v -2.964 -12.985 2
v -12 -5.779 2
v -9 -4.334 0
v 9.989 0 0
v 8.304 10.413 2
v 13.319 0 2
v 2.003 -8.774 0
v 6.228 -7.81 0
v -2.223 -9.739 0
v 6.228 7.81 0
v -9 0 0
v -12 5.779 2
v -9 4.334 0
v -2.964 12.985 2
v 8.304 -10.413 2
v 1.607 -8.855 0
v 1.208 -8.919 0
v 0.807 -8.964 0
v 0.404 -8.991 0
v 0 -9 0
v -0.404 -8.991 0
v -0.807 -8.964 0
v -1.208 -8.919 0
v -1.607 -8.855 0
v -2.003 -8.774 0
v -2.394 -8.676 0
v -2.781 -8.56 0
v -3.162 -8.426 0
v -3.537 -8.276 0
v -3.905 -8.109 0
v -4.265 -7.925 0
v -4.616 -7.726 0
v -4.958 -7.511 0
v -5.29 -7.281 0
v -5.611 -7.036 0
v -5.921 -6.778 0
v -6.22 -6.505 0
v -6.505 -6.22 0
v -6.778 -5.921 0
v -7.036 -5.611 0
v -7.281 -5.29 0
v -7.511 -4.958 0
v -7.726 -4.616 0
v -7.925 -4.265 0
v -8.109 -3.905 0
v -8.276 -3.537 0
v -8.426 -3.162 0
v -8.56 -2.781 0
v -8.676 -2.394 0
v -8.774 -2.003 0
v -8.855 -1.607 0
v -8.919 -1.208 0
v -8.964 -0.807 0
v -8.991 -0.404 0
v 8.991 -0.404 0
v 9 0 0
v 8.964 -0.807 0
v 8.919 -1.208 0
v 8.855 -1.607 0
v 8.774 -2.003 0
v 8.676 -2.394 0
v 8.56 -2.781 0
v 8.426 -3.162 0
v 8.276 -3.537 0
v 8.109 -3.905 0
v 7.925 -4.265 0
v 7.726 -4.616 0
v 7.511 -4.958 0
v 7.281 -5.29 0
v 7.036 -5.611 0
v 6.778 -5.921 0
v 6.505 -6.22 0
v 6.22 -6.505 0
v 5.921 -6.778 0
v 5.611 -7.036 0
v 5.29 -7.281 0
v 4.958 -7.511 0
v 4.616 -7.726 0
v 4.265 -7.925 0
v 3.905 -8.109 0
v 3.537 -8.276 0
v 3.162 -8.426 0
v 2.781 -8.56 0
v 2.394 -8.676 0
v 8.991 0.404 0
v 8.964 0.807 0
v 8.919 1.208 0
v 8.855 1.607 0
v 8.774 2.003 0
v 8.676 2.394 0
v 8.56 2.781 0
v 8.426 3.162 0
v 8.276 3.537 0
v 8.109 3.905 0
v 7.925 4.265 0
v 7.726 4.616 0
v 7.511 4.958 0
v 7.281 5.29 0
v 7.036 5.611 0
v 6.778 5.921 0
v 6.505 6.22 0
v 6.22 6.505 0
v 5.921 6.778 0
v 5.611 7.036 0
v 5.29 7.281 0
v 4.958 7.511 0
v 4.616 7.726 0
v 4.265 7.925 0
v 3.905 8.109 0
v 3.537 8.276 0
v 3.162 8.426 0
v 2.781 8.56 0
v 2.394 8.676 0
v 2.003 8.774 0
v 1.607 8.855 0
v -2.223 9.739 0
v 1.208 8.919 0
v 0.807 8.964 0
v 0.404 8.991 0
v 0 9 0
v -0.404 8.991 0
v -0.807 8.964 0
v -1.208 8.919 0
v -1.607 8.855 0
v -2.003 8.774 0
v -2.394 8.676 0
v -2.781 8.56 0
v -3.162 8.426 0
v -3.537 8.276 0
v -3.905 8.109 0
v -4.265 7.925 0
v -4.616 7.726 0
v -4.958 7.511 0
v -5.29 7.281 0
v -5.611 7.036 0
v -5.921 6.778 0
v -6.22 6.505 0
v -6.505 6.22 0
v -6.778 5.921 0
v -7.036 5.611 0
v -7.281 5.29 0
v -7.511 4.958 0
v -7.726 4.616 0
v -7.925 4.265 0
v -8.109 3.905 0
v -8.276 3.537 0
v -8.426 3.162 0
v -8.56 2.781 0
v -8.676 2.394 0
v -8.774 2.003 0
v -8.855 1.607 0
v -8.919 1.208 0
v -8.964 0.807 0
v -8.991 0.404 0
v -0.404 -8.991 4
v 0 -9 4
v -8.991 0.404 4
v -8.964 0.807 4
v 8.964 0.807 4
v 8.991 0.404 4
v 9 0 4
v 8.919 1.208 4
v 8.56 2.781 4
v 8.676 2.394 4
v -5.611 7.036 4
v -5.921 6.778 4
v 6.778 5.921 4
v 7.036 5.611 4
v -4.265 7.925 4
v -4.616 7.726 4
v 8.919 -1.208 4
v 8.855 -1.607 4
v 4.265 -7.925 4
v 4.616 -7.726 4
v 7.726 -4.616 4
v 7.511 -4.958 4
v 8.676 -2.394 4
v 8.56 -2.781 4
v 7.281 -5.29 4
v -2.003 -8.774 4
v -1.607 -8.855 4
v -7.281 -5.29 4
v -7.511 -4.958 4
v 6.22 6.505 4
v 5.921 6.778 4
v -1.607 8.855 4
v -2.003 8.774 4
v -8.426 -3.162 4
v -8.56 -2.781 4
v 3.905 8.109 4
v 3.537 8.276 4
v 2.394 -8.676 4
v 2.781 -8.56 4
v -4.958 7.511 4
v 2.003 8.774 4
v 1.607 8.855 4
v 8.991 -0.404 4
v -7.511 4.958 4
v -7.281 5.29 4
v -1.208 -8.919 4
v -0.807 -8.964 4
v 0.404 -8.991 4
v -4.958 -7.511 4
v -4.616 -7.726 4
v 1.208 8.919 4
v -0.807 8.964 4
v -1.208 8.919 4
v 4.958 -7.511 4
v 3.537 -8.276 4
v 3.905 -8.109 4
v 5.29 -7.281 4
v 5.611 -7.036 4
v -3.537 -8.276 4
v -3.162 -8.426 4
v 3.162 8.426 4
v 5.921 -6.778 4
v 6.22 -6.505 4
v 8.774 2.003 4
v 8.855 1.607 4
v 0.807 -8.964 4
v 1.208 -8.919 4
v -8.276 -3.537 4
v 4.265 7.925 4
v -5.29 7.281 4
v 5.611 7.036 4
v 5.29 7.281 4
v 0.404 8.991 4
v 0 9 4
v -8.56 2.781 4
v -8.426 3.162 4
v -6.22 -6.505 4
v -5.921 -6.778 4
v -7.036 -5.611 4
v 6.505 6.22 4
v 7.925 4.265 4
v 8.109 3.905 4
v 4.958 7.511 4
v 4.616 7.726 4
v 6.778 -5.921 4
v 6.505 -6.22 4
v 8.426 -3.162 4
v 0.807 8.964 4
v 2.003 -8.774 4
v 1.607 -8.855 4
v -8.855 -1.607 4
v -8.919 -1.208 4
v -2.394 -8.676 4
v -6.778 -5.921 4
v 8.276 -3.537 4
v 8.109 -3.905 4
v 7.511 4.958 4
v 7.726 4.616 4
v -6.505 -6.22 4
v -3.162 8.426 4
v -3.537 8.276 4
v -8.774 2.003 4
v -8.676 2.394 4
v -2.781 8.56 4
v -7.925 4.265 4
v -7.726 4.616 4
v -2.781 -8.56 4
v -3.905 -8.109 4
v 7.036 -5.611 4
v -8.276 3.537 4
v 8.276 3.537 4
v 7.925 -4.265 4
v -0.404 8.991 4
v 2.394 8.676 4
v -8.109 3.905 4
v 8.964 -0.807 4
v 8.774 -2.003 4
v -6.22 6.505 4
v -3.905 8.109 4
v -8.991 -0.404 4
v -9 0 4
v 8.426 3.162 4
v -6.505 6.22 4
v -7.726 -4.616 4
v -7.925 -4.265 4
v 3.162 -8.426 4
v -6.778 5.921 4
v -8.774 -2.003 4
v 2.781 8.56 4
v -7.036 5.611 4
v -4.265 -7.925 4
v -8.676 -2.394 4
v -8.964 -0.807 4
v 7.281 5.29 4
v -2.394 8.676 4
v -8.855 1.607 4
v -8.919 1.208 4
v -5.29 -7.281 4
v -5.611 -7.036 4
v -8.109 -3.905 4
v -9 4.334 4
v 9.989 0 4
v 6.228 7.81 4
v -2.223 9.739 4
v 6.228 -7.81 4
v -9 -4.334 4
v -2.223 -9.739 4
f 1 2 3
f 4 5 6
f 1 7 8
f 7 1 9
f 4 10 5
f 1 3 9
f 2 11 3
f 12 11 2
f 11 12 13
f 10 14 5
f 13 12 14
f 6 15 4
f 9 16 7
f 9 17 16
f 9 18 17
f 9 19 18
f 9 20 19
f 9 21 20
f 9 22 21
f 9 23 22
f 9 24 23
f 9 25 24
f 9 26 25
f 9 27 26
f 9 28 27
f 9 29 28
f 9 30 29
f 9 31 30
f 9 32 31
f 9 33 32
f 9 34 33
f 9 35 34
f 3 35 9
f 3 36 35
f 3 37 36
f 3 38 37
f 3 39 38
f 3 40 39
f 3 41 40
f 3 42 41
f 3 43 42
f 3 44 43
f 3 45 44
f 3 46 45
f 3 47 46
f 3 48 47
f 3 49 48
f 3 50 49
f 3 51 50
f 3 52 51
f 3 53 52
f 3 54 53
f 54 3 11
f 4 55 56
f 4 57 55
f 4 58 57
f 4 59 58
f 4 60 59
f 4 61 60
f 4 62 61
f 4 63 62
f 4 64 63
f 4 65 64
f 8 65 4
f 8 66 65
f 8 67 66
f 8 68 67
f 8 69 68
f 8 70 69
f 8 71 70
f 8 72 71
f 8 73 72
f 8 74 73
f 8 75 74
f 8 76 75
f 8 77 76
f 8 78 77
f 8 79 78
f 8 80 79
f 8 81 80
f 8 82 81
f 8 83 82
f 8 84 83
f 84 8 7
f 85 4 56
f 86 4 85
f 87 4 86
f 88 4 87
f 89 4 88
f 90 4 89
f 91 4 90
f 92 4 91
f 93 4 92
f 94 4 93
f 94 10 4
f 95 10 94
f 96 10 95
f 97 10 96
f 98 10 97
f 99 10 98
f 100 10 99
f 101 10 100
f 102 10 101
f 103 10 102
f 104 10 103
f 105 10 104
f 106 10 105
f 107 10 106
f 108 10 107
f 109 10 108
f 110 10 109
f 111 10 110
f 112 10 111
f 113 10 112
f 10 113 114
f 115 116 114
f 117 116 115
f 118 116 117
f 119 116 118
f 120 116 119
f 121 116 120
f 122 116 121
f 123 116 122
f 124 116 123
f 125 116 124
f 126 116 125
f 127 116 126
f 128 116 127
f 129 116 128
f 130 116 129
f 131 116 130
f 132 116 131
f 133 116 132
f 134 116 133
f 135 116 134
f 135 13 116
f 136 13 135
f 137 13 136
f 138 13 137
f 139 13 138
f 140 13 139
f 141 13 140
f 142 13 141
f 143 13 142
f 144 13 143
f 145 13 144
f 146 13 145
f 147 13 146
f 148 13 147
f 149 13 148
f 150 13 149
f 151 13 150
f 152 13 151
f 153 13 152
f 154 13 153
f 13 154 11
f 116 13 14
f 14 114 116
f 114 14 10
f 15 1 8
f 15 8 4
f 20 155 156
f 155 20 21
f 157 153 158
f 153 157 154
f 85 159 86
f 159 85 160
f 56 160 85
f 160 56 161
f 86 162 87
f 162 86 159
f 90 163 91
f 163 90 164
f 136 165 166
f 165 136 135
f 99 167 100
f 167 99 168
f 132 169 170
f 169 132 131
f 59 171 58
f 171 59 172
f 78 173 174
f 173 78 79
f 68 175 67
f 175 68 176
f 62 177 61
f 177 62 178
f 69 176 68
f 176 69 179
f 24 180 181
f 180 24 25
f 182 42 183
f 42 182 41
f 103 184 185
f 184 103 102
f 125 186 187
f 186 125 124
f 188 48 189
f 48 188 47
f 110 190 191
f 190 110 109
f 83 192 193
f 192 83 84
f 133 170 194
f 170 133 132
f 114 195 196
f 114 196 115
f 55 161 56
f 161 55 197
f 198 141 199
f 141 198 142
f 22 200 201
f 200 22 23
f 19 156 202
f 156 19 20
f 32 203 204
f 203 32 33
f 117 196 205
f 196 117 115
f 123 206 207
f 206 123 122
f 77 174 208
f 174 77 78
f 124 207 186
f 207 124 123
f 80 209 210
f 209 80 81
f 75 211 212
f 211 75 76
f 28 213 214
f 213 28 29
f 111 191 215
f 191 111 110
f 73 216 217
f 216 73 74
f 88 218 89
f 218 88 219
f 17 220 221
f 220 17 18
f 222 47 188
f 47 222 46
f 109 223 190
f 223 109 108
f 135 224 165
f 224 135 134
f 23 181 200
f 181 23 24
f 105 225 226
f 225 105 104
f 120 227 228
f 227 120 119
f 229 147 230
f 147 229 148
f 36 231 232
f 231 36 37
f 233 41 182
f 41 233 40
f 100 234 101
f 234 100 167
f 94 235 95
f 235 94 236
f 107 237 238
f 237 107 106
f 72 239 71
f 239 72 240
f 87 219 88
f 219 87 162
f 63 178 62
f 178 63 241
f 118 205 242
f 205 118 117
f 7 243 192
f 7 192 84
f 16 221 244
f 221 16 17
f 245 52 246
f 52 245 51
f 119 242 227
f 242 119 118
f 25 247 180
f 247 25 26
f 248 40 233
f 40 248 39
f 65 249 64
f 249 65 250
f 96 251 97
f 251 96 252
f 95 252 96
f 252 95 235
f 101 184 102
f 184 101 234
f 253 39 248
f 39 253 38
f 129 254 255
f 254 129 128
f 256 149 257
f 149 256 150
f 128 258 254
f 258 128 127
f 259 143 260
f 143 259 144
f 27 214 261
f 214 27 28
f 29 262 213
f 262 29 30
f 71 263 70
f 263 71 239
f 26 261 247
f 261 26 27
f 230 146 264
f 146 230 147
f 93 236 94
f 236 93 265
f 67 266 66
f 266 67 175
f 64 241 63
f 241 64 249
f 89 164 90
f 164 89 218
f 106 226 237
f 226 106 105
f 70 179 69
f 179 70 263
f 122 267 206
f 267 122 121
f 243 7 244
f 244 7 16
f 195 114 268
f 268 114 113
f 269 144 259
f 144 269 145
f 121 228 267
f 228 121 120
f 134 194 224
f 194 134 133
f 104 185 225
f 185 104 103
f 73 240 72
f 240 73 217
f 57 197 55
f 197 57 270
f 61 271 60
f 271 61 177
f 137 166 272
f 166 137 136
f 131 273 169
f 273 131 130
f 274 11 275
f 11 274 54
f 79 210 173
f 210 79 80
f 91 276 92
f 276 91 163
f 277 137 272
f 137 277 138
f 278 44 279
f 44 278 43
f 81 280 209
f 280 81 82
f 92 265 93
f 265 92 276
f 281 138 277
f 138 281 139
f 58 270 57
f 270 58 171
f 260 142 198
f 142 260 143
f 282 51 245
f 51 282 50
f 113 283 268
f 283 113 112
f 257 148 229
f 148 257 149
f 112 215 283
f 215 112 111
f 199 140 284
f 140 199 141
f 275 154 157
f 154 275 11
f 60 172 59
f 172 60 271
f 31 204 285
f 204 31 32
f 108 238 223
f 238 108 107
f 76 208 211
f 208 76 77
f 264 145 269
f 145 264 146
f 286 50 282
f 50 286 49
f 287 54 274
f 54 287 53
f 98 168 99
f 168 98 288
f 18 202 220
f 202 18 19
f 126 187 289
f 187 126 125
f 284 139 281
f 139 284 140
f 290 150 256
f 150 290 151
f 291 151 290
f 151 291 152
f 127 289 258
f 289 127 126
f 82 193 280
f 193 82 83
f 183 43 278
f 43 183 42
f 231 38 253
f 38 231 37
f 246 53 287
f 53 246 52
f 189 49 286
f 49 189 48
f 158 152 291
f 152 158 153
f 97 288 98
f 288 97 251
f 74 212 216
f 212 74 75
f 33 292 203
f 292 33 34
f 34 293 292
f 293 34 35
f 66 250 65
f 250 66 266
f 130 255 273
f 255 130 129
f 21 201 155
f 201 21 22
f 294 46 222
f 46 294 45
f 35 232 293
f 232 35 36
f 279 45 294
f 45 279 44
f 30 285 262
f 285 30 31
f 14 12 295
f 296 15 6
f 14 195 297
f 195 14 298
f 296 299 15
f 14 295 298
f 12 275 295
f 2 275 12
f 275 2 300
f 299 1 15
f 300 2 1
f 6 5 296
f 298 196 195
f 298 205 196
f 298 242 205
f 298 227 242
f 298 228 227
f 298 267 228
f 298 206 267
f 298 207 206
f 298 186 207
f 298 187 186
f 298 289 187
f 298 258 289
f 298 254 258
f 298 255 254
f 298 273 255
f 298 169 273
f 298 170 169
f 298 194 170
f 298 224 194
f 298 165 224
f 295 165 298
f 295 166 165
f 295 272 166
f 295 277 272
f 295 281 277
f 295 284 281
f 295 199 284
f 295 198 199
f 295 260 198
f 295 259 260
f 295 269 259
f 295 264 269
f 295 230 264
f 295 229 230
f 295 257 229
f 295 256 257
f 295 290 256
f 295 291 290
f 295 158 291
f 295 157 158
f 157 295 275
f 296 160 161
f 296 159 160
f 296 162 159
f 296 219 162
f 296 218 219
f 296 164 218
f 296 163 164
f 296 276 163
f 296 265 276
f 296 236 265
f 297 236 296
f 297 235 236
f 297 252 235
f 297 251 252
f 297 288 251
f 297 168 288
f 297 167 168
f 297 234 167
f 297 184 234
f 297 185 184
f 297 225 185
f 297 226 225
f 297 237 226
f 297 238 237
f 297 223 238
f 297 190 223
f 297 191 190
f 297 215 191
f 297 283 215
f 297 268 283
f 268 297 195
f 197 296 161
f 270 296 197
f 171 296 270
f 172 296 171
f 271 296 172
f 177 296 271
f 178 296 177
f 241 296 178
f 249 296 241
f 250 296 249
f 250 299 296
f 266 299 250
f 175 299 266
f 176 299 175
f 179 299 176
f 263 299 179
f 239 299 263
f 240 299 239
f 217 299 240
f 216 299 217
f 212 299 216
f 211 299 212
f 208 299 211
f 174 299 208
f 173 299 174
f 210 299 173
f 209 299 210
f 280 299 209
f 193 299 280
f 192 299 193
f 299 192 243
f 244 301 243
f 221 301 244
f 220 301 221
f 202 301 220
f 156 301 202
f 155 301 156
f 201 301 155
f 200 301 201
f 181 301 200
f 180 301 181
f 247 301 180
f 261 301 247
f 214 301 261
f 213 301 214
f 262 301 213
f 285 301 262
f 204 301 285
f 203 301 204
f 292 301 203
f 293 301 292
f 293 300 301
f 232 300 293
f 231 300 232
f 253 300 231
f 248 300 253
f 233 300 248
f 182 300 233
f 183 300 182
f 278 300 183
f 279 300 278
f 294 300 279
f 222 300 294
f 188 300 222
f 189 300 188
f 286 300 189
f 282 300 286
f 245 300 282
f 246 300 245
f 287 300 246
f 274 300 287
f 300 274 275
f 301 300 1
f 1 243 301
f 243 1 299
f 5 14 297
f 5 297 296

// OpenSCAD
/* [Main parameters] */

// Bone's diameter
d = 18;

// Length
h = 4;

// Width of each corner
w = 3;

// Number of polygon sides
sides = 7;

/* [Extra parameters] */

// Inner circle's (hole's) detail
detail = 10;

// More width to help with 3D printing (slicing)
extra_inner_w = 0;

/* [Hidden] */
r = d/2;

// The design is comprised of two mirror half rings.
// -
// This is the first one.
// -
module half_ring (r = r, w = w, h = h, sides = sides,
				  extra_inner_w = extra_inner_w)
{
	h = h/2;

	// Circumscribed, around the hole, radius of 
	// a heptagon.
	// -
	circumscr_r = (r + extra_inner_w) / cos(360/(2*sides));
	
	difference()
	{
		linear_extrude(height = h, 
					   scale=(r + w)/(r + extra_inner_w))
		circle(r = circumscr_r,$fn=sides);
		// Main hole.
		// -
		// Move it a bit to make it visible
		// -
		translate([0,0,-1])
		#cylinder(r = r, h = h + 2, 
				  $fn=2 * detail * sides);
	}
}

module ring (r = r, w = w, h = h, sides = sides)
{
	half_ring(r,w,h, sides);
	rotate([180,0,0])
	translate([0,0,-h])
	half_ring(r,w,h, sides);
}

color("lime")
ring(r,w,h);
